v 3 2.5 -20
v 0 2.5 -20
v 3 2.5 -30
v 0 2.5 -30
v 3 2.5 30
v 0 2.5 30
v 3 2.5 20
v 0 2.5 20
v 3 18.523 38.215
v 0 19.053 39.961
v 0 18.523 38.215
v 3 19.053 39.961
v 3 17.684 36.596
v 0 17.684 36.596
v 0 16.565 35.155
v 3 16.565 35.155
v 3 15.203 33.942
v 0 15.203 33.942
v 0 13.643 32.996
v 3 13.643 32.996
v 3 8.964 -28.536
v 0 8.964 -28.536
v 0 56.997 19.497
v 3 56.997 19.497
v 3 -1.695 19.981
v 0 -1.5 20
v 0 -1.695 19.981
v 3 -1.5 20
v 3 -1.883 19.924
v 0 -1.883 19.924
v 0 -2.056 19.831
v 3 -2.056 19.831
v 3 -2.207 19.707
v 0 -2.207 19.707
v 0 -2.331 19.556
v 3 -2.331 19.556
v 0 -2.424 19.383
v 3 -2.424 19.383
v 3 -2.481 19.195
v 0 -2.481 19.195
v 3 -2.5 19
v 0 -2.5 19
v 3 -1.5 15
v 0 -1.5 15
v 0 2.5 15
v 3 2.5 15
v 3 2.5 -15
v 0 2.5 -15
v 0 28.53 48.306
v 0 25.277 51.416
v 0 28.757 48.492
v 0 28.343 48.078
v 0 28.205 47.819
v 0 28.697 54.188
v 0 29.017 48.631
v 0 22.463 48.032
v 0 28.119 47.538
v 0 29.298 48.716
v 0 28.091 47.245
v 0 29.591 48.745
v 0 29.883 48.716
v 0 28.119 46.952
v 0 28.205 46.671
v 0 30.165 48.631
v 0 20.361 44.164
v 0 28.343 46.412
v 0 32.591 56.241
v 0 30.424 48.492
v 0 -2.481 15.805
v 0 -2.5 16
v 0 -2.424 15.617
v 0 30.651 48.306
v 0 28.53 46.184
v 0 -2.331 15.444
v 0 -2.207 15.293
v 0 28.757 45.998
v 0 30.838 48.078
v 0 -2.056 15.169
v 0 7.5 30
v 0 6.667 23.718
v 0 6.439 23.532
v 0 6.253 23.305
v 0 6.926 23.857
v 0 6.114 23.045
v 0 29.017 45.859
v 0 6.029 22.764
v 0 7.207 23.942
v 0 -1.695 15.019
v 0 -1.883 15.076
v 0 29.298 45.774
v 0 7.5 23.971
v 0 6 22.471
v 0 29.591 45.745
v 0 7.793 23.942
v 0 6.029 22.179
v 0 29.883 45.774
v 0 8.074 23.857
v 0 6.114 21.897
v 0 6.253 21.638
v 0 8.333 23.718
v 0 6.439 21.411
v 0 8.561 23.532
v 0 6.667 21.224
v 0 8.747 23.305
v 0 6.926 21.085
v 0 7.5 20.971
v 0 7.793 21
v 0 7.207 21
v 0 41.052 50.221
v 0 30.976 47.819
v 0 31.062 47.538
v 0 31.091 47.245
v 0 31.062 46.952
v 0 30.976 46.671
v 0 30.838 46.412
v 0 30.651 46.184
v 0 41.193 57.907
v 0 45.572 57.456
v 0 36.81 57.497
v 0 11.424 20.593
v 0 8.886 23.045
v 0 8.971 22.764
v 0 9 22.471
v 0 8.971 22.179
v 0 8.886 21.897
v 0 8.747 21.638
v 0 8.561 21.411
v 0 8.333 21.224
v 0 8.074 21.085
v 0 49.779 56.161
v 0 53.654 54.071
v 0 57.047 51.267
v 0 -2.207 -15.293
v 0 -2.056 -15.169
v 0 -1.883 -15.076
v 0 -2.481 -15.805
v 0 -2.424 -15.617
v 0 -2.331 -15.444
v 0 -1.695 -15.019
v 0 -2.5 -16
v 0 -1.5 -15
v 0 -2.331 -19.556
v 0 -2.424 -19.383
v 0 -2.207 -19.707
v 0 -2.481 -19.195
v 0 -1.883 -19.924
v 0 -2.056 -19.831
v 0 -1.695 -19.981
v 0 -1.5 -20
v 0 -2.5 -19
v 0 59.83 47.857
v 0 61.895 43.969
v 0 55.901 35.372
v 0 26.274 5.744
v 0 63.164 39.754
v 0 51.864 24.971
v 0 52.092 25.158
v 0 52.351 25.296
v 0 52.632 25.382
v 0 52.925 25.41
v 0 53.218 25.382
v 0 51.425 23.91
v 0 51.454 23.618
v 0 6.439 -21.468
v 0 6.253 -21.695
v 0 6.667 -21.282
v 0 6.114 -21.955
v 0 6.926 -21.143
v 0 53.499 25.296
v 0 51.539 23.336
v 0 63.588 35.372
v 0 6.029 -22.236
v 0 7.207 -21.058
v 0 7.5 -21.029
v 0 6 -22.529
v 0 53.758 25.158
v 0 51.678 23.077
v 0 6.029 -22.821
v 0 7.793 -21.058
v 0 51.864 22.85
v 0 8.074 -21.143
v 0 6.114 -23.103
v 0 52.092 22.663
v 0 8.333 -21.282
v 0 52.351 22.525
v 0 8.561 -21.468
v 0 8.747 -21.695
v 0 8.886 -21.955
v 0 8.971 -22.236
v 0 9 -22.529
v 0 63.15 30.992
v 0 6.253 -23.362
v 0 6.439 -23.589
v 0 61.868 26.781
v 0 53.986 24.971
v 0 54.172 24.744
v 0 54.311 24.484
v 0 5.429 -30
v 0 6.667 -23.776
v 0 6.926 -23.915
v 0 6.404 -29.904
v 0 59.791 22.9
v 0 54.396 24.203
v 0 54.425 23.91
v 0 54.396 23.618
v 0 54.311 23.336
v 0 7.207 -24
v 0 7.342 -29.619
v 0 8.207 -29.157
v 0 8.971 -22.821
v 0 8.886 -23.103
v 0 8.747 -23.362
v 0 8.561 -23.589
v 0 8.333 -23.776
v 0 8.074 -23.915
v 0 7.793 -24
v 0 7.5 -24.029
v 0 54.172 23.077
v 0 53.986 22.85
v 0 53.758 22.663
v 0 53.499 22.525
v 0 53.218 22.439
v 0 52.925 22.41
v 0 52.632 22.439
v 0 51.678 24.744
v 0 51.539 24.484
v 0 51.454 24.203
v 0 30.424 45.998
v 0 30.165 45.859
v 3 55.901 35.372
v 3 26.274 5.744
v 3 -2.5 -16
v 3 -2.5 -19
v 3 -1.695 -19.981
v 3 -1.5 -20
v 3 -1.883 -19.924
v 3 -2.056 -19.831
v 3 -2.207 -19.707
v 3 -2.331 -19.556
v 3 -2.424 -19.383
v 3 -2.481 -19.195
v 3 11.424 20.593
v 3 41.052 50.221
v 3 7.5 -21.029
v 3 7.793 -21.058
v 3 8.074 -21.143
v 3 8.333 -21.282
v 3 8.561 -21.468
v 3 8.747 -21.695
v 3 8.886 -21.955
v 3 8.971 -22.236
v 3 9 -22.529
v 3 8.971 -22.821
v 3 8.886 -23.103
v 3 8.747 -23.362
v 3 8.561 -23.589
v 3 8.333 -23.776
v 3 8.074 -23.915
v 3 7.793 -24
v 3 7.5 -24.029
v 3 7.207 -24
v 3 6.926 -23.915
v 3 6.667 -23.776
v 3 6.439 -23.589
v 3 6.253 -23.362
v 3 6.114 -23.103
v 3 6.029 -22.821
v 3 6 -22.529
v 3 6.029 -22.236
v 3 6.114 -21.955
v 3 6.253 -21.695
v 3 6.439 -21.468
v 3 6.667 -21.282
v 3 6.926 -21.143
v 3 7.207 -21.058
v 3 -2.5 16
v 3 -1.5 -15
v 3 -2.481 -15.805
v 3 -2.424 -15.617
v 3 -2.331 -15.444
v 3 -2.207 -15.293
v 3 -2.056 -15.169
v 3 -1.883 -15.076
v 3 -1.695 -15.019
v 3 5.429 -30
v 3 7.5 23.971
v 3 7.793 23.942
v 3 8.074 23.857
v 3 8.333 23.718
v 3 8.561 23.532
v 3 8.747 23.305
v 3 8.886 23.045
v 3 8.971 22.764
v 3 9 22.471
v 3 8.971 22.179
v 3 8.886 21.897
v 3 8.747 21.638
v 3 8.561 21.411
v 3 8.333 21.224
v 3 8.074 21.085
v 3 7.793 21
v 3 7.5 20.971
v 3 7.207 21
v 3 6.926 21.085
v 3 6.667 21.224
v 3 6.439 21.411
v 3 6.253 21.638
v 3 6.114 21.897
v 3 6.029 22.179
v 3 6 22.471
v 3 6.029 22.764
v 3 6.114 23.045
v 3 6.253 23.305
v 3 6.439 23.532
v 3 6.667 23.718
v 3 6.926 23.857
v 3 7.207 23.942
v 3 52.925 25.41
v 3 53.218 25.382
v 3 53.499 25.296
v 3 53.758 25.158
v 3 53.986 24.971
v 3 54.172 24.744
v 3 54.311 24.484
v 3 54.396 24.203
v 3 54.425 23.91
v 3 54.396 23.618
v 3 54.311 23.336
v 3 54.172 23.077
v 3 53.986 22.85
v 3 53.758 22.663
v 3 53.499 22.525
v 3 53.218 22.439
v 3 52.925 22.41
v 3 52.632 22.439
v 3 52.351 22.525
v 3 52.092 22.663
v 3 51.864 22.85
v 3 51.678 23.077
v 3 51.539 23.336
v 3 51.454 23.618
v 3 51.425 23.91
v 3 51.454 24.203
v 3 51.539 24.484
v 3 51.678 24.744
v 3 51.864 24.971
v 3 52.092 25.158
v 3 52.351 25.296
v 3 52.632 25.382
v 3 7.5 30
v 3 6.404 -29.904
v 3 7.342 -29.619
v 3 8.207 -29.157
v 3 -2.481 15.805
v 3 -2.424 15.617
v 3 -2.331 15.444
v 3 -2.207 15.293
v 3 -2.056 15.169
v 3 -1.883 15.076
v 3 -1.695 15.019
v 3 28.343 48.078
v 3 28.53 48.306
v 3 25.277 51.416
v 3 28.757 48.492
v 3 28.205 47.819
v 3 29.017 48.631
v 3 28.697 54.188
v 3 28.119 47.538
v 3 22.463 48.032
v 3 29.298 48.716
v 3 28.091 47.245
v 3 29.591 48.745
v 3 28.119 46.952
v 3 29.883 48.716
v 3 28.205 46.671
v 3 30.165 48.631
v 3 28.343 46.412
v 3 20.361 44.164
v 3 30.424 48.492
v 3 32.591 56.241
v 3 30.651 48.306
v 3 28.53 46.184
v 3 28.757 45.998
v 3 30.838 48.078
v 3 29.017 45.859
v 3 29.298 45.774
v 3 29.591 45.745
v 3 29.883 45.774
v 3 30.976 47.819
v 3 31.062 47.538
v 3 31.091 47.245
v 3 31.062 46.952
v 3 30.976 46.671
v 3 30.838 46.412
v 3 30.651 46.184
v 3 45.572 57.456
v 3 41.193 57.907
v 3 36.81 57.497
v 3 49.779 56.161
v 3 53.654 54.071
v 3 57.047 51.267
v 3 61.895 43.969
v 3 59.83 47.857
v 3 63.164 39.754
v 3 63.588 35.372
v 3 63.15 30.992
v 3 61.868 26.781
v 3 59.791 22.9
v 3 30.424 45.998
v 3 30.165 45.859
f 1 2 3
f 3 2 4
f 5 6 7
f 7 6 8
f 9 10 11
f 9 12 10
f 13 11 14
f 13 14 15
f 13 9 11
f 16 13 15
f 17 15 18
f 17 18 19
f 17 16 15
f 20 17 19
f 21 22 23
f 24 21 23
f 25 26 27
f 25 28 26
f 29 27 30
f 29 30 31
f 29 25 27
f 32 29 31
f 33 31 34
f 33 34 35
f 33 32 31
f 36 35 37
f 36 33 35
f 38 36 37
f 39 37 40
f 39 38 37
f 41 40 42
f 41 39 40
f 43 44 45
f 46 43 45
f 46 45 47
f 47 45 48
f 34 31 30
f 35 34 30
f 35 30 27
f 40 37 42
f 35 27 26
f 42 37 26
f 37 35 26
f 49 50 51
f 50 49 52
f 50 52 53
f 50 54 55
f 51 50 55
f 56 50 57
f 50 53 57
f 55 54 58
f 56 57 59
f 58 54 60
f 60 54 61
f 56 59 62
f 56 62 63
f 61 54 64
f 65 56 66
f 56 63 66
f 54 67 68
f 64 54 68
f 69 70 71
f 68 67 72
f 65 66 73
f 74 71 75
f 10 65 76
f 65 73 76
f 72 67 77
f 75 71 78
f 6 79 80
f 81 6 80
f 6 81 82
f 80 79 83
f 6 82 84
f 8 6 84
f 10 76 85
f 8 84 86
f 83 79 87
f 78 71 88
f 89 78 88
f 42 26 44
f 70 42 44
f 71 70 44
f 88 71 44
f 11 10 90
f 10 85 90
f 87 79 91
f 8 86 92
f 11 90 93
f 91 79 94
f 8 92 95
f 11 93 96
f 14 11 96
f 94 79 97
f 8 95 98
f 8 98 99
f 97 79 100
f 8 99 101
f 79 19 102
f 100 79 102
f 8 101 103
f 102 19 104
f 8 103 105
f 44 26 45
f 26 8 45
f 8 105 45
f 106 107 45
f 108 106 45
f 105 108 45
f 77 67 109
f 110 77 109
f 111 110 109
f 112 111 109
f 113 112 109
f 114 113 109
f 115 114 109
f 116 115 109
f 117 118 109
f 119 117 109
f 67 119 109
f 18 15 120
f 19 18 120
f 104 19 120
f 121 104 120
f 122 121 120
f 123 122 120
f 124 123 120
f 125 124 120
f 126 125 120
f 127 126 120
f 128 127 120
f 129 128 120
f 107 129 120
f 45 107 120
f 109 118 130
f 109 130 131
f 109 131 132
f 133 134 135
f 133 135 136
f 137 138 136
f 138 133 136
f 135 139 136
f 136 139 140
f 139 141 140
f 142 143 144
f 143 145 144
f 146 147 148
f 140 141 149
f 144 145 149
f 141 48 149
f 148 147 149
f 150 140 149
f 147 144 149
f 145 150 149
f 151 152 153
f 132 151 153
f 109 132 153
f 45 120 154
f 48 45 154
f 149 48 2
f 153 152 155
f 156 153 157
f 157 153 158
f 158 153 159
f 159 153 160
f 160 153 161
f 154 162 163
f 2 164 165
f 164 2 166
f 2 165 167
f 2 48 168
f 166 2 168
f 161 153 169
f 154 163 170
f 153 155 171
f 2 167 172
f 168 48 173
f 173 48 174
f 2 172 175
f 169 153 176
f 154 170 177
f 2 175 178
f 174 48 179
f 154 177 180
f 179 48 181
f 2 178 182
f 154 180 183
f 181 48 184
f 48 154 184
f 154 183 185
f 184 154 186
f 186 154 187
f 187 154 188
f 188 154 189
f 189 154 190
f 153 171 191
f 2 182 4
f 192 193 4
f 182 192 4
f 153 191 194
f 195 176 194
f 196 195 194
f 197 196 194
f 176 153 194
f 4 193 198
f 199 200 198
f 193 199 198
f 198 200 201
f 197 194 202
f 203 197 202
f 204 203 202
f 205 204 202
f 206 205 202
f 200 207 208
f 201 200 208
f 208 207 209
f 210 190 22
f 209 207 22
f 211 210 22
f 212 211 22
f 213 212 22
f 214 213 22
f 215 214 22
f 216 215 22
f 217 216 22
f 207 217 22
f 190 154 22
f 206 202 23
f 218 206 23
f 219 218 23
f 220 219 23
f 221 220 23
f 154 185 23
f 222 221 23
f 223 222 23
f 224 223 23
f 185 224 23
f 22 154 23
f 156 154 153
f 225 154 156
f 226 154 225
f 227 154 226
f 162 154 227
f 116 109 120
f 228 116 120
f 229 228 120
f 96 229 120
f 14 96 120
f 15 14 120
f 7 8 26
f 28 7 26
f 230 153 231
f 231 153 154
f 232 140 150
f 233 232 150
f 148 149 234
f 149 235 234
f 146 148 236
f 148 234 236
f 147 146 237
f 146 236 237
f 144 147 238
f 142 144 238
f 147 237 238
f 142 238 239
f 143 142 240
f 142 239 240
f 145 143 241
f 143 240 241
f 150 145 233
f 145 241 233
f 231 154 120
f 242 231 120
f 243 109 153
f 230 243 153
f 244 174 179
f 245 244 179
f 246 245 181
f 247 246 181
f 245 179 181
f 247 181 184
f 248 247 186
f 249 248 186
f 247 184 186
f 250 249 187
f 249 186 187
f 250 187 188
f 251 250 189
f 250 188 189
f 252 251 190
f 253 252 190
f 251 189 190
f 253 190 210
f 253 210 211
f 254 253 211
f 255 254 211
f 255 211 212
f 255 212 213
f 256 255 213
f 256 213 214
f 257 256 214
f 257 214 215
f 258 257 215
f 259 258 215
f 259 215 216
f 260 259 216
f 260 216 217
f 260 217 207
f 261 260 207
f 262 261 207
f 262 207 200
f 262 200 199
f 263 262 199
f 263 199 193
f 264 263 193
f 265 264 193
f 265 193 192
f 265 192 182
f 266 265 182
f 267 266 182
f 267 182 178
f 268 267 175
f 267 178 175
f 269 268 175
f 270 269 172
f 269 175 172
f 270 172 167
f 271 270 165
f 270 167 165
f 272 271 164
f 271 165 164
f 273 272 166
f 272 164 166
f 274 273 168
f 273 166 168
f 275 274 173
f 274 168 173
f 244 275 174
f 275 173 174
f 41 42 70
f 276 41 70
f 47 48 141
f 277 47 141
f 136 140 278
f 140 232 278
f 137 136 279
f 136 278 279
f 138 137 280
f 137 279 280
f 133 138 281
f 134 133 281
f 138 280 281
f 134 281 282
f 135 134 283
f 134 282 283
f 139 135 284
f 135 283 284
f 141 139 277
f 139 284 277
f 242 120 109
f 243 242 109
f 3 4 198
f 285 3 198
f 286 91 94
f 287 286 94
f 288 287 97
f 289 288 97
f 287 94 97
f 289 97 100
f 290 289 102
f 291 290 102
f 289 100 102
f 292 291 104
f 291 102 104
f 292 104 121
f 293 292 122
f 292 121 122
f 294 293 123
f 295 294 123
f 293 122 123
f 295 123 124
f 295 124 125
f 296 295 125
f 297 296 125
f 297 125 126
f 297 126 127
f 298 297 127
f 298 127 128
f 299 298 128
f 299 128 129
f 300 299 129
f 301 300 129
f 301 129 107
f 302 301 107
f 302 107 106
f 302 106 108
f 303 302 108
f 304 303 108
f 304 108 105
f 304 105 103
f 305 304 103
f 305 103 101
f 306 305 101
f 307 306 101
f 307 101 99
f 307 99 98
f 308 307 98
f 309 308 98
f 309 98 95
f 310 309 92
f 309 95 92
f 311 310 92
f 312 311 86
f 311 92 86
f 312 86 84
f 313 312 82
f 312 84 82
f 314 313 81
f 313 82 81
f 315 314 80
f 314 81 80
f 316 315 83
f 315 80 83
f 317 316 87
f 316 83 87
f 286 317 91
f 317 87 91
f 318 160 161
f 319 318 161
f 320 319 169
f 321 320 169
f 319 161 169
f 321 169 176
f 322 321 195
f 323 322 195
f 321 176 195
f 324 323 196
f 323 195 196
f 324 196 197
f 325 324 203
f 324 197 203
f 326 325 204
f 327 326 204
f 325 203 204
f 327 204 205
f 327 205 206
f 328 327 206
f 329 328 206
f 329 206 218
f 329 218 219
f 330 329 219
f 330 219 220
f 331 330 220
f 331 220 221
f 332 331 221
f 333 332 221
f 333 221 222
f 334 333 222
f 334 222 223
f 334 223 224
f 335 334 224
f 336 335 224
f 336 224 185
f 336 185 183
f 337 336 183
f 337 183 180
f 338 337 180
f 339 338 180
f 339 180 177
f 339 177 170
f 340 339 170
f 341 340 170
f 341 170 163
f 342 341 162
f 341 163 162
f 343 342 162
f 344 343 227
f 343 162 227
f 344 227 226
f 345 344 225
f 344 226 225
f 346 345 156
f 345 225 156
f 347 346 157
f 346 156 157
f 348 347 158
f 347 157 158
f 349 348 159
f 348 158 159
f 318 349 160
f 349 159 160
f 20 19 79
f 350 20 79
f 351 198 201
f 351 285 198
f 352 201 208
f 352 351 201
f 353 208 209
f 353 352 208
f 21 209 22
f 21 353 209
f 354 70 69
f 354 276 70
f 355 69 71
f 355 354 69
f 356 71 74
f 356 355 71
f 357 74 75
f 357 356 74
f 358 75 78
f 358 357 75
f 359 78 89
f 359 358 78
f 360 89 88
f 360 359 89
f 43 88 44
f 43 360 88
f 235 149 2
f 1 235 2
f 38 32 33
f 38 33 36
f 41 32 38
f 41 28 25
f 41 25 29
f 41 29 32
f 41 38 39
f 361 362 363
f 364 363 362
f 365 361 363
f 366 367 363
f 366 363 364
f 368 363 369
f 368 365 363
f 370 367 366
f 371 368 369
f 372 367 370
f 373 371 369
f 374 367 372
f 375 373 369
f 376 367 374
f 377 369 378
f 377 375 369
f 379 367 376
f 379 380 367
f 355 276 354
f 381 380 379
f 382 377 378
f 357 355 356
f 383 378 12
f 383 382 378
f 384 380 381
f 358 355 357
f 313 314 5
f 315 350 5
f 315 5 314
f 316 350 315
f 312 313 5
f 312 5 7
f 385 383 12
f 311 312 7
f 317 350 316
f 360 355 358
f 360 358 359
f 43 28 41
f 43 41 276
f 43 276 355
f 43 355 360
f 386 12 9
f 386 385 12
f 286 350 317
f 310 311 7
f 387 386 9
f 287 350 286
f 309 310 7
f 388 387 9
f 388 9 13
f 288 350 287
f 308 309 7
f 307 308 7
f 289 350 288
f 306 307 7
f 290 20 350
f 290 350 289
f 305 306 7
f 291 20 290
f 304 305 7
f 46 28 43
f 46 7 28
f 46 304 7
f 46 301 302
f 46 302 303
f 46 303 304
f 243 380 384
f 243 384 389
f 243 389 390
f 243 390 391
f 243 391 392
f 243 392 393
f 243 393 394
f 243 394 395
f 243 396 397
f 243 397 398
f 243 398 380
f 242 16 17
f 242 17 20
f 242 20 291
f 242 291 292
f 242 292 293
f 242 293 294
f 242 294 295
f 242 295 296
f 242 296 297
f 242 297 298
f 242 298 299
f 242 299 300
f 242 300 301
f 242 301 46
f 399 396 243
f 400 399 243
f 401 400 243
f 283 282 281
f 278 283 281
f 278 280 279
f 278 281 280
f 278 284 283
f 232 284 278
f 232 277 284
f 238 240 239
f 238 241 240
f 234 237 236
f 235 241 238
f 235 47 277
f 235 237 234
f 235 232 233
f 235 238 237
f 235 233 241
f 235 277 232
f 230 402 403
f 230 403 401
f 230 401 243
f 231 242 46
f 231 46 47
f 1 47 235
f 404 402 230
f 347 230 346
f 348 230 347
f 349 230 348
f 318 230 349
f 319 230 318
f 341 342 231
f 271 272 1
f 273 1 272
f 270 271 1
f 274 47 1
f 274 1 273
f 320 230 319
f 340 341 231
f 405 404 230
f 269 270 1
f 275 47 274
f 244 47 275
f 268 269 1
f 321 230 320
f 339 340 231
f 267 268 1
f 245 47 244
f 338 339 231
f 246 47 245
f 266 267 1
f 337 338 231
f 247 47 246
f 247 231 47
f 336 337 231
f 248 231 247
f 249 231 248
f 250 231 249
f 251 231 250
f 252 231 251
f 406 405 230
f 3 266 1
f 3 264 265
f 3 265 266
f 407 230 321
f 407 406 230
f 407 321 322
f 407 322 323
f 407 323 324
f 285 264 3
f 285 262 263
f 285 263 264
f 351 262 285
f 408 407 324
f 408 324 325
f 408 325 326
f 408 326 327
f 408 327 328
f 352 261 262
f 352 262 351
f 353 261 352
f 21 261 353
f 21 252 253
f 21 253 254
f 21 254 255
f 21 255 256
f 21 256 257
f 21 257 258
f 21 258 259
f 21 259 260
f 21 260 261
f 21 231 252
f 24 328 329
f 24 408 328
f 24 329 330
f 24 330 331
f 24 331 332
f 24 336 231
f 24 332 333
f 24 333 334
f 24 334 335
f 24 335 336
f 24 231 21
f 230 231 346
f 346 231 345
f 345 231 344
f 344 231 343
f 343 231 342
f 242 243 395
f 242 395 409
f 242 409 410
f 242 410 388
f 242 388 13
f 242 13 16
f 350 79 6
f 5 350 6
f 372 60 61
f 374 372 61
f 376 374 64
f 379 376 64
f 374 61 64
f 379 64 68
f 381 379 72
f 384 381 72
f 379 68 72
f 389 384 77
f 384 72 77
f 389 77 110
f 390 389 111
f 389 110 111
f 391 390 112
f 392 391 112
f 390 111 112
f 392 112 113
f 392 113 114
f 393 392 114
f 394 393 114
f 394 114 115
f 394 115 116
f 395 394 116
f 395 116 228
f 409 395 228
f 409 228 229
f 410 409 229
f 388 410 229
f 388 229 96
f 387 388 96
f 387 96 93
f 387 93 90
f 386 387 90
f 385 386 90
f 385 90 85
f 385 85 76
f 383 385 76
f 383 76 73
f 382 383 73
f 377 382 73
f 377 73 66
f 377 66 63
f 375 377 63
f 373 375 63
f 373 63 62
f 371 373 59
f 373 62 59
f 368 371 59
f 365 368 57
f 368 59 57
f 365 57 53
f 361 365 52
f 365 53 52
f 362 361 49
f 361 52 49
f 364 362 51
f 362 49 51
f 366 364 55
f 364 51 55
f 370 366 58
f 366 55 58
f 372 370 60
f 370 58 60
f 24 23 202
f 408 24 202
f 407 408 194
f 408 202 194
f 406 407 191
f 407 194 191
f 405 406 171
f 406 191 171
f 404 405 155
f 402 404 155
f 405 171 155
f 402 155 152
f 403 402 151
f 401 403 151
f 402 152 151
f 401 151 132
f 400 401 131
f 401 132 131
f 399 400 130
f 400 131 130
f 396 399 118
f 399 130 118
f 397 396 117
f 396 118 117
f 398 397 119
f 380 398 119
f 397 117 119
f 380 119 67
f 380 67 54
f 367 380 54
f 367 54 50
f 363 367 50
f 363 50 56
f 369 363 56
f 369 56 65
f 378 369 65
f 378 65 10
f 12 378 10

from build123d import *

# Parameters (mm, degrees)
BOSS_EXTRUDE1_DEPTH = 3
CUT_EXTRUDE2_DEPTH  = 10
SKETCH5_R           = 1.5
CUT_EXTRUDE3_DEPTH  = 10
FILLET1_R           = 10
FILLET2_R           = 1
FILLET3_R           = 5


with BuildPart() as part:
    # Sketch3 → Boss-Extrude1 (new body)
    with BuildSketch(Plane(origin=(0, 0, 0), x_dir=(0, 0, -1), z_dir=(1, 0, 0))):
        with BuildLine():
            Line((15, -2.5), (20, -2.5))
            Line((20, -2.5), (20, 2.5))
            Line((20, 2.5), (30, 2.5))
            Line((30, 2.5), (30, 7.5))
            Line((30, 7.5), (-19.497474683, 56.997474683))
            ThreePointArc((-19.497474683, 56.997474683), (-56.194666741, 49.697949335), (-35.40737726, 18.587572106))
            Line((-35.40737726, 18.587572106), (-30, 7.5))
            Line((-30, 7.5), (-30, 2.5))
            Line((-30, 2.5), (-20, 2.5))
            Line((-20, 2.5), (-20, -2.5))
            Line((-20, -2.5), (-15, -2.5))
            Line((-15, -2.5), (-15, 2.5))
            Line((-15, 2.5), (15, 2.5))
            Line((15, 2.5), (15, -2.5))
        make_face()
    extrude(amount=BOSS_EXTRUDE1_DEPTH)

    # Sketch4 → Cut-Extrude2 (cut)
    with BuildSketch(Plane.ZY):
        Polygon((35.372021921, 55.901459172), (5.744247789, 26.273685041), (20.593490194, 11.424442636), (50.221264326, 41.052216767), align=None)
    extrude(amount=-CUT_EXTRUDE2_DEPTH, mode=Mode.SUBTRACT)

    # Sketch5 → Cut-Extrude3 (cut)
    with BuildSketch(Plane.ZY):
        with Locations((22.471283385, 7.5)):
            Circle(SKETCH5_R)
        with Locations((-22.528716615, 7.5)):
            Circle(SKETCH5_R)
        with Locations((23.910377597, 52.925096223)):
            Circle(SKETCH5_R)
        with Locations((47.244901376, 29.590572444)):
            Circle(SKETCH5_R)
    extrude(amount=-CUT_EXTRUDE3_DEPTH, mode=Mode.SUBTRACT)

    # Fillet1
    fillet1_edges = [part.edges().sort_by_distance(p)[0] for p in [
        (1.5, 18.587572106, 35.40737726),
    ]]
    fillet(fillet1_edges, radius=FILLET1_R)

    # Fillet2
    fillet2_edges = [part.edges().sort_by_distance(p)[0] for p in [
        (1.5, -2.5, -20),
        (1.5, -2.5, -15),
        (1.5, -2.5, 15),
        (1.5, -2.5, 20),
    ]]
    fillet(fillet2_edges, radius=FILLET2_R)

    # Fillet3
    fillet3_edges = [part.edges().sort_by_distance(p)[0] for p in [
        (1.5, 7.5, -30),
    ]]
    fillet(fillet3_edges, radius=FILLET3_R)


solid = part.part
